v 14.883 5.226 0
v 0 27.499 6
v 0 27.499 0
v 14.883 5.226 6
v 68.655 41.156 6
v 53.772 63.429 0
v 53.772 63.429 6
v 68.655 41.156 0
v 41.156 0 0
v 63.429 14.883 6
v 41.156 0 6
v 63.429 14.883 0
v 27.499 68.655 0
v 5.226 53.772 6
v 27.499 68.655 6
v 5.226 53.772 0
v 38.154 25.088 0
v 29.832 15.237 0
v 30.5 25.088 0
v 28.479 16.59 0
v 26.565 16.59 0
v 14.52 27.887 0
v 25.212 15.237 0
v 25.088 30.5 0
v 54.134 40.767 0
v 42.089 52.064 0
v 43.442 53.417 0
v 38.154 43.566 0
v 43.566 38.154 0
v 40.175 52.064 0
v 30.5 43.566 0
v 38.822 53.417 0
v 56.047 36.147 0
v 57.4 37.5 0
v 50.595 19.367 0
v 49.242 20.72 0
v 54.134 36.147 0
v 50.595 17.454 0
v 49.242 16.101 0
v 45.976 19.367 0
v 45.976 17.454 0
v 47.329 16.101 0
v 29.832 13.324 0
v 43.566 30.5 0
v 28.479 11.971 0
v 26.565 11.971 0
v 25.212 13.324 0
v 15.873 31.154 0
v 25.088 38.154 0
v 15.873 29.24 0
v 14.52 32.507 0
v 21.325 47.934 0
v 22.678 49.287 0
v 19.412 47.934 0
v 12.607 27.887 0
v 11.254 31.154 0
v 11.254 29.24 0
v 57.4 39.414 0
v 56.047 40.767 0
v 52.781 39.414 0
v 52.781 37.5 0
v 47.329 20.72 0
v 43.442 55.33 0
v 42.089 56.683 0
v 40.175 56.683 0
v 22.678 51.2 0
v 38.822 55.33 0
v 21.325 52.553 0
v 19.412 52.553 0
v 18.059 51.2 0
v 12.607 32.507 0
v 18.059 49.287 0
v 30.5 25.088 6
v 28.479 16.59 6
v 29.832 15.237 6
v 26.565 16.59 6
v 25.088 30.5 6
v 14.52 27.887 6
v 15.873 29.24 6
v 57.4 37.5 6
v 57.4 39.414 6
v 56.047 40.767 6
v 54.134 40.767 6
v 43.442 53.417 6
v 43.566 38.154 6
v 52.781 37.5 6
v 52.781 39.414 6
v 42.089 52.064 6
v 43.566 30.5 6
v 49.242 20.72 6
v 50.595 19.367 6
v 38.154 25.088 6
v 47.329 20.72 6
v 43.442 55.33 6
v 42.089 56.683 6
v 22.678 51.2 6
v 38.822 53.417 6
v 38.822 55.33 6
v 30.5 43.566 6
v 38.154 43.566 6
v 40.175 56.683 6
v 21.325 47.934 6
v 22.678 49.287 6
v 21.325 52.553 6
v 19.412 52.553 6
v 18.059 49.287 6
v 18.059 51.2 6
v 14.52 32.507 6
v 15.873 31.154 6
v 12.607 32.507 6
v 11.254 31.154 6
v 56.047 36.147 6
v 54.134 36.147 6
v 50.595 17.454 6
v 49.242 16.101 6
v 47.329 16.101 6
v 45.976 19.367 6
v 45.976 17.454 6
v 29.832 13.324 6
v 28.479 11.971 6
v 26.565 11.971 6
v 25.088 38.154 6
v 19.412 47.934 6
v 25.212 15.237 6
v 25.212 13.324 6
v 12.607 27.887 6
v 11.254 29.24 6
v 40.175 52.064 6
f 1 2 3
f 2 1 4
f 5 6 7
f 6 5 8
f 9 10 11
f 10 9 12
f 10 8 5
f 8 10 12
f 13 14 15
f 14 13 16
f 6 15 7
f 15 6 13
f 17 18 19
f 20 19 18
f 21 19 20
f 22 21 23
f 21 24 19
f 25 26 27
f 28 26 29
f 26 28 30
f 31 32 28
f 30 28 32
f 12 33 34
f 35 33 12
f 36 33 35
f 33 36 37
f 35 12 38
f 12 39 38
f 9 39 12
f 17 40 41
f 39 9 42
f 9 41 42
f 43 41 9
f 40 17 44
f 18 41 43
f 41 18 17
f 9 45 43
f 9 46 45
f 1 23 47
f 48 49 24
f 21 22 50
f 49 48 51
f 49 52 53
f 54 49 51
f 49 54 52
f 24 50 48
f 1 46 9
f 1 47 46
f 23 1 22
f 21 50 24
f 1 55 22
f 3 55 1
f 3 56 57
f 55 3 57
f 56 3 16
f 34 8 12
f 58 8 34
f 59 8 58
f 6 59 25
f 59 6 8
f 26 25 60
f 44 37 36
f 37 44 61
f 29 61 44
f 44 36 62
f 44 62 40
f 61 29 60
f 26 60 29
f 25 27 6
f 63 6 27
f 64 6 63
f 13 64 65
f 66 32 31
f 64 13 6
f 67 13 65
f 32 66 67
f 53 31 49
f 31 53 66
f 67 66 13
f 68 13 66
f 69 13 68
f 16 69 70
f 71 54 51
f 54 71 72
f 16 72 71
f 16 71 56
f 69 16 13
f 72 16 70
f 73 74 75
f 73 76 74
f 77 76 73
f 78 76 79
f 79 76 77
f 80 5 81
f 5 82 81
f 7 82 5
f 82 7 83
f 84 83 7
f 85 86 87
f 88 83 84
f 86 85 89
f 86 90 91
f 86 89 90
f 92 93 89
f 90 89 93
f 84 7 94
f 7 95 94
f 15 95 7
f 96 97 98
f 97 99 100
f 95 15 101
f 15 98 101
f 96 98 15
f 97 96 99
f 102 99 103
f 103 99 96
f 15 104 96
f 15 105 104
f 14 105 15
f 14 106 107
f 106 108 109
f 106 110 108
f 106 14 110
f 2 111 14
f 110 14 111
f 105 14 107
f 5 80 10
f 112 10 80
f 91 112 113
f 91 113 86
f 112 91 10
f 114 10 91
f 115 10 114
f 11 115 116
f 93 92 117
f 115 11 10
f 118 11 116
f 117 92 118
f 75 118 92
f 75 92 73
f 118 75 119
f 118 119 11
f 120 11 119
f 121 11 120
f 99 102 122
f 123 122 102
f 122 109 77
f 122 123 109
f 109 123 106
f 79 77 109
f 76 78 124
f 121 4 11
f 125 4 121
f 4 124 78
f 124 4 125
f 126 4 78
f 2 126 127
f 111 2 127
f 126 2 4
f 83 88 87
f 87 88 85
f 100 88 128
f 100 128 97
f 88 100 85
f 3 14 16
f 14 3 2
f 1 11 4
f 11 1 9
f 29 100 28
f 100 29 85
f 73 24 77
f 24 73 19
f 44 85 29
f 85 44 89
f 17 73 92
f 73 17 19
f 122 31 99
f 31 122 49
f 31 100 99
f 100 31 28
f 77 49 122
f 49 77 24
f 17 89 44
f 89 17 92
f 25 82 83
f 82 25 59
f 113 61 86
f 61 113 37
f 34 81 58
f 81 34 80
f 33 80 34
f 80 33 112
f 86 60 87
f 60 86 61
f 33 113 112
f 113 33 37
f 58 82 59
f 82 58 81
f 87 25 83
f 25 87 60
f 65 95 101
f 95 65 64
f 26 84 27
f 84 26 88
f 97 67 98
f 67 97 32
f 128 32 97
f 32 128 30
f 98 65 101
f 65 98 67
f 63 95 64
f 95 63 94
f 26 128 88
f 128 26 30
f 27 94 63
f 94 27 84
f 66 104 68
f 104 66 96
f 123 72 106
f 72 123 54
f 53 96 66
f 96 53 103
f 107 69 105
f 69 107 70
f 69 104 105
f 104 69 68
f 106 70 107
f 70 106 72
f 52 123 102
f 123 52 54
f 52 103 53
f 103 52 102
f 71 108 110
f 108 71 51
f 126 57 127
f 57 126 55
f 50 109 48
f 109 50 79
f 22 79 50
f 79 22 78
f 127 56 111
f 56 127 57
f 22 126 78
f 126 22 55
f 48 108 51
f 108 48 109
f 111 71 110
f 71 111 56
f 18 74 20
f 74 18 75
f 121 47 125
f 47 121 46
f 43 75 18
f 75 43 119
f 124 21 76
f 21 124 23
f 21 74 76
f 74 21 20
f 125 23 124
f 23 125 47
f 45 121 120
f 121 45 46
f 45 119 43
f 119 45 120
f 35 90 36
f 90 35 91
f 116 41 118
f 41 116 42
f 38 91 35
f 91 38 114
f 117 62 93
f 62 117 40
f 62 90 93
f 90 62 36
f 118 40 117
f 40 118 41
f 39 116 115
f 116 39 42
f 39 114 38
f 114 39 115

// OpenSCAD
$fn = 32;

// ----------------------------------------------------------------------
// Polygon plate: 8-gon R35, 6 bolt windows
// ----------------------------------------------------------------------

// --- parameters (mm) ---
sides = 8;                // number of polygon sides
plate_r = 35;             // circumscribed radius of the polygon
bore_r = 10;              // centre bore radius
bolts = 6;                // number of bolt windows
ring_r = 21.17;           // bolt-circle radius
bolt_r = 2.5;             // bolt window radius
plate_t = 6;              // plate thickness, Z (extrusion height)

plate_d = 2 * plate_r;  // circumscribed diameter
bore_d = 2 * bore_r;  // centre bore diameter
bolt_d = 2 * bolt_r;  // bolt window diameter
ring_d = 2 * ring_r;  // bolt-circle diameter

profile = [[68.655, 41.156], [53.772, 63.429], [27.499, 68.655], [5.226, 53.772], [0, 27.499], [14.883, 5.226], [41.156, 0], [63.429, 14.883]];  // primary outline, 8 points, counter clockwise
void_1 = [[43.566, 38.154], [38.154, 43.566], [30.5, 43.566], [25.088, 38.154], [25.088, 30.5], [30.5, 25.088], [38.154, 25.088], [43.566, 30.5]];  // centre bore, 8 points
void_2 = [[57.4, 39.414], [56.047, 40.767], [54.134, 40.767], [52.781, 39.414], [52.781, 37.5], [54.134, 36.147], [56.047, 36.147], [57.4, 37.5]];  // bolt window 1, 8 points
void_3 = [[43.442, 55.33], [42.089, 56.683], [40.175, 56.683], [38.822, 55.33], [38.822, 53.417], [40.175, 52.064], [42.089, 52.064], [43.442, 53.417]];  // bolt window 2, 8 points
void_4 = [[22.678, 51.2], [21.325, 52.553], [19.412, 52.553], [18.059, 51.2], [18.059, 49.287], [19.412, 47.934], [21.325, 47.934], [22.678, 49.287]];  // bolt window 3, 8 points
void_5 = [[15.873, 31.154], [14.52, 32.507], [12.607, 32.507], [11.254, 31.154], [11.254, 29.24], [12.607, 27.887], [14.52, 27.887], [15.873, 29.24]];  // bolt window 4, 8 points
void_6 = [[29.832, 15.237], [28.479, 16.59], [26.565, 16.59], [25.212, 15.237], [25.212, 13.324], [26.565, 11.971], [28.479, 11.971], [29.832, 13.324]];  // bolt window 5, 8 points
void_7 = [[50.595, 19.367], [49.242, 20.72], [47.329, 20.72], [45.976, 19.367], [45.976, 17.454], [47.329, 16.101], [49.242, 16.101], [50.595, 17.454]];  // bolt window 6, 8 points

// --- the one profile operation ---
difference() {
  linear_extrude(height = plate_t) polygon(points = profile);
  translate([0, 0, -1])
    linear_extrude(height = plate_t + 2) polygon(points = void_1);
  translate([0, 0, -1])
    linear_extrude(height = plate_t + 2) polygon(points = void_2);
  translate([0, 0, -1])
    linear_extrude(height = plate_t + 2) polygon(points = void_3);
  translate([0, 0, -1])
    linear_extrude(height = plate_t + 2) polygon(points = void_4);
  translate([0, 0, -1])
    linear_extrude(height = plate_t + 2) polygon(points = void_5);
  translate([0, 0, -1])
    linear_extrude(height = plate_t + 2) polygon(points = void_6);
  translate([0, 0, -1])
    linear_extrude(height = plate_t + 2) polygon(points = void_7);
}
